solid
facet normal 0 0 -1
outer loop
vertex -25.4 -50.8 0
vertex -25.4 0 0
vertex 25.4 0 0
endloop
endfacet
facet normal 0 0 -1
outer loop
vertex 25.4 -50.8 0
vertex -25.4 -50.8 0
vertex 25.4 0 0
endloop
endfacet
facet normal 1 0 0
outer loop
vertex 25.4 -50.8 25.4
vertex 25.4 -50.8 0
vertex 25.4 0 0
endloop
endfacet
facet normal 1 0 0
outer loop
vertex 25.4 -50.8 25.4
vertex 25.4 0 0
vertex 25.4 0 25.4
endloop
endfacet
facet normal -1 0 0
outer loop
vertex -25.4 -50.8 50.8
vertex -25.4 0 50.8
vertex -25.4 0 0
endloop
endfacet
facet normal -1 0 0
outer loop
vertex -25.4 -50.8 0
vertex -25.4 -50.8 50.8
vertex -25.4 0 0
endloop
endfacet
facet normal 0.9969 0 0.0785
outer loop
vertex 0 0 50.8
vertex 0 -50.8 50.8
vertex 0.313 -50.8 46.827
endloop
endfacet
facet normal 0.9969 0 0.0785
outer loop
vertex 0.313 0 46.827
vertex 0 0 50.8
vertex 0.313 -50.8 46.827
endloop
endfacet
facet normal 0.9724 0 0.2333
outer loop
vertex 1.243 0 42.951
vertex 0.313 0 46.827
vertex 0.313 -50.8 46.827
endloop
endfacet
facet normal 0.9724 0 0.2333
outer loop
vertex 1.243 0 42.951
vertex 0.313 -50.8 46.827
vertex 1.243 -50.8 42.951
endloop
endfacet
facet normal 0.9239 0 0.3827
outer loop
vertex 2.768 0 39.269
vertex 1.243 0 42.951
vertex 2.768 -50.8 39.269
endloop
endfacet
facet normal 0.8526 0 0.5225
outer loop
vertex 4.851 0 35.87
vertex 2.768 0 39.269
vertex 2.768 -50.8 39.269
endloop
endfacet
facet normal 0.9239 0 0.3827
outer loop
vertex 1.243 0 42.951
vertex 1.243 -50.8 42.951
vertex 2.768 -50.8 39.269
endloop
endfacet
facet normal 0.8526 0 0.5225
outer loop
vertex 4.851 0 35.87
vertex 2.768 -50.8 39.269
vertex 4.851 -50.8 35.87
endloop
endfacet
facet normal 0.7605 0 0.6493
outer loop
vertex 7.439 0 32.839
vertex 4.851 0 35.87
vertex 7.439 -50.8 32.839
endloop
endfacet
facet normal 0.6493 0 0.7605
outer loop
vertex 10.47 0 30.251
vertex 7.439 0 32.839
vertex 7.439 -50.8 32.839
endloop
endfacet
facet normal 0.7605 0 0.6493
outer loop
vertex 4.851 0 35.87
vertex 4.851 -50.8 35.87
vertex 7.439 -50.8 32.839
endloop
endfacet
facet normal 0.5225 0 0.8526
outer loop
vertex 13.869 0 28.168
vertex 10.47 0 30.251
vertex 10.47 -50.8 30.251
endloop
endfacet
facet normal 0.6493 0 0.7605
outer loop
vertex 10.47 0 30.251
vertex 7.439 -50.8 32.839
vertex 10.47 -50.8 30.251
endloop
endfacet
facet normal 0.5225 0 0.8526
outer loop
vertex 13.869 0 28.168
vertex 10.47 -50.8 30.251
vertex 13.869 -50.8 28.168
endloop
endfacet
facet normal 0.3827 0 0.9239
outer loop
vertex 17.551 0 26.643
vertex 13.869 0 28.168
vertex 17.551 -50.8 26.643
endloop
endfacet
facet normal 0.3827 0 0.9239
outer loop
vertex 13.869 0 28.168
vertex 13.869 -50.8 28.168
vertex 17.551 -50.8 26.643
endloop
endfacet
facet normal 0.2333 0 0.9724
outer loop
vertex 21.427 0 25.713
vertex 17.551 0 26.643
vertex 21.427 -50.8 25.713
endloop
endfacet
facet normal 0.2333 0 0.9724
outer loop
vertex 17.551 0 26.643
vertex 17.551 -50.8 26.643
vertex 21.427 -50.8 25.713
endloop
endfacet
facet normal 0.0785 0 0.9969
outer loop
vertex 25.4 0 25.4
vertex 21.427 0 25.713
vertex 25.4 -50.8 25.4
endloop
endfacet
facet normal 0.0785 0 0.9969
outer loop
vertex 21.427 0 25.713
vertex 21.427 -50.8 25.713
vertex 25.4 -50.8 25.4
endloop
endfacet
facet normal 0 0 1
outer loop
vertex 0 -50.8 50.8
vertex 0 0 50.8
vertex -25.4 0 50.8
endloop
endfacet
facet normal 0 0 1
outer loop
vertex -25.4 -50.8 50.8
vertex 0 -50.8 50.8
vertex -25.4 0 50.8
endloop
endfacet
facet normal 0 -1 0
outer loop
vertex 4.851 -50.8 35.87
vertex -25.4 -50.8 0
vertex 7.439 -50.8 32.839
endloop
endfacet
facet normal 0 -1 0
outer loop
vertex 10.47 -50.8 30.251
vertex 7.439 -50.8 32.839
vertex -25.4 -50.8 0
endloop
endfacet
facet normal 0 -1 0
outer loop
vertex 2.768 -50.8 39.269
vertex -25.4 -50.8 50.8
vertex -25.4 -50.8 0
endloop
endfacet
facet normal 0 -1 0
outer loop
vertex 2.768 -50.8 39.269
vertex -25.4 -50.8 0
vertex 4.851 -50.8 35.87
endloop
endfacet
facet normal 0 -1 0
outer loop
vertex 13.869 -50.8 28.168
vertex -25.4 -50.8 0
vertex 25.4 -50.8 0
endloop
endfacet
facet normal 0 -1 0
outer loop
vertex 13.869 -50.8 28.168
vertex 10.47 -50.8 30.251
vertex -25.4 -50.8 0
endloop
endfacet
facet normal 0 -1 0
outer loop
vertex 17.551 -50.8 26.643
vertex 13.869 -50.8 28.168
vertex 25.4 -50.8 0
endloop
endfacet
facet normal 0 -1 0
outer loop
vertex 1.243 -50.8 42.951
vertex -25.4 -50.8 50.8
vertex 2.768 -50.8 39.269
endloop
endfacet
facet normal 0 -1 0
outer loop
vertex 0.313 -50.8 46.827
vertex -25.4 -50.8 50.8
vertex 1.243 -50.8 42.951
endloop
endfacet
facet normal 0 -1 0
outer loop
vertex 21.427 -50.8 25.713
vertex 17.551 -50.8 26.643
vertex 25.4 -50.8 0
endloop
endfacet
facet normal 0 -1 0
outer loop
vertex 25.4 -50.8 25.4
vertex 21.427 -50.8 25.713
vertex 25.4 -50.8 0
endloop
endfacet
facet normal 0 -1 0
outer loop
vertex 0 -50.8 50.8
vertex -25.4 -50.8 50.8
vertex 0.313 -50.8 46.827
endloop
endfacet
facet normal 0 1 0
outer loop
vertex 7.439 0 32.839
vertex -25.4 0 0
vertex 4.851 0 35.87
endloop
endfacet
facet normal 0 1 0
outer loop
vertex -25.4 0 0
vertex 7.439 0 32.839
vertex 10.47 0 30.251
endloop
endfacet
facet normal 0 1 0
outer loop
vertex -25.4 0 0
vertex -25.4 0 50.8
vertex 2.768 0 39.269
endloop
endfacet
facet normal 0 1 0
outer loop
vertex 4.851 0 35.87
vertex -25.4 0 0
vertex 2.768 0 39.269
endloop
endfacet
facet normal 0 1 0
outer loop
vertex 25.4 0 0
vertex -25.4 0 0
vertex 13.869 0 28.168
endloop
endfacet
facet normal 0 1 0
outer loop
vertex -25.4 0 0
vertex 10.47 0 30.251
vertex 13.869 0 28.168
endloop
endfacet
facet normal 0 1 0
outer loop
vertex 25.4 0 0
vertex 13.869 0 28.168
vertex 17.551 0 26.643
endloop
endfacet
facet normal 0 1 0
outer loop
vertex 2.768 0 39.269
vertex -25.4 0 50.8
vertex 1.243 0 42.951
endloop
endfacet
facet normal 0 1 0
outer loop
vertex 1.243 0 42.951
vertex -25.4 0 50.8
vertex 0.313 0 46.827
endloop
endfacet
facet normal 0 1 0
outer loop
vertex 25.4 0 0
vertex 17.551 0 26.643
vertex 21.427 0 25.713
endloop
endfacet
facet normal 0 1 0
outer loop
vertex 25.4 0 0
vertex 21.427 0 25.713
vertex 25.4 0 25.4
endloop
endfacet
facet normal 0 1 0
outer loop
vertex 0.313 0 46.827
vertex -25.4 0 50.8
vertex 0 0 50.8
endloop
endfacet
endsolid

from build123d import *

# Parameters (mm, degrees)
F1_DEPTH = 50.8
F3_DEPTH = 50.8


with BuildPart() as f1:
    # F0 (on Front) → F1 (new body)
    with BuildSketch(Plane.XZ):
        Polygon((-25.4, 0), (0, 0), (25.4, 0), (25.4, 50.8), (-25.4, 50.8), align=None)
    extrude(amount=F1_DEPTH)

    # F2 (on face) → F3 (cut)
    with BuildSketch(Plane.XZ.offset(50.8)):
        with BuildLine():
            ThreePointArc((0, 50.8), (7.439488, 32.839488), (25.4, 25.4))
            Line((25.4, 25.4), (25.4, 50.8))
            Line((25.4, 50.8), (0, 50.8))
        make_face()
    extrude(amount=-F3_DEPTH, mode=Mode.SUBTRACT)


solid = f1.part
